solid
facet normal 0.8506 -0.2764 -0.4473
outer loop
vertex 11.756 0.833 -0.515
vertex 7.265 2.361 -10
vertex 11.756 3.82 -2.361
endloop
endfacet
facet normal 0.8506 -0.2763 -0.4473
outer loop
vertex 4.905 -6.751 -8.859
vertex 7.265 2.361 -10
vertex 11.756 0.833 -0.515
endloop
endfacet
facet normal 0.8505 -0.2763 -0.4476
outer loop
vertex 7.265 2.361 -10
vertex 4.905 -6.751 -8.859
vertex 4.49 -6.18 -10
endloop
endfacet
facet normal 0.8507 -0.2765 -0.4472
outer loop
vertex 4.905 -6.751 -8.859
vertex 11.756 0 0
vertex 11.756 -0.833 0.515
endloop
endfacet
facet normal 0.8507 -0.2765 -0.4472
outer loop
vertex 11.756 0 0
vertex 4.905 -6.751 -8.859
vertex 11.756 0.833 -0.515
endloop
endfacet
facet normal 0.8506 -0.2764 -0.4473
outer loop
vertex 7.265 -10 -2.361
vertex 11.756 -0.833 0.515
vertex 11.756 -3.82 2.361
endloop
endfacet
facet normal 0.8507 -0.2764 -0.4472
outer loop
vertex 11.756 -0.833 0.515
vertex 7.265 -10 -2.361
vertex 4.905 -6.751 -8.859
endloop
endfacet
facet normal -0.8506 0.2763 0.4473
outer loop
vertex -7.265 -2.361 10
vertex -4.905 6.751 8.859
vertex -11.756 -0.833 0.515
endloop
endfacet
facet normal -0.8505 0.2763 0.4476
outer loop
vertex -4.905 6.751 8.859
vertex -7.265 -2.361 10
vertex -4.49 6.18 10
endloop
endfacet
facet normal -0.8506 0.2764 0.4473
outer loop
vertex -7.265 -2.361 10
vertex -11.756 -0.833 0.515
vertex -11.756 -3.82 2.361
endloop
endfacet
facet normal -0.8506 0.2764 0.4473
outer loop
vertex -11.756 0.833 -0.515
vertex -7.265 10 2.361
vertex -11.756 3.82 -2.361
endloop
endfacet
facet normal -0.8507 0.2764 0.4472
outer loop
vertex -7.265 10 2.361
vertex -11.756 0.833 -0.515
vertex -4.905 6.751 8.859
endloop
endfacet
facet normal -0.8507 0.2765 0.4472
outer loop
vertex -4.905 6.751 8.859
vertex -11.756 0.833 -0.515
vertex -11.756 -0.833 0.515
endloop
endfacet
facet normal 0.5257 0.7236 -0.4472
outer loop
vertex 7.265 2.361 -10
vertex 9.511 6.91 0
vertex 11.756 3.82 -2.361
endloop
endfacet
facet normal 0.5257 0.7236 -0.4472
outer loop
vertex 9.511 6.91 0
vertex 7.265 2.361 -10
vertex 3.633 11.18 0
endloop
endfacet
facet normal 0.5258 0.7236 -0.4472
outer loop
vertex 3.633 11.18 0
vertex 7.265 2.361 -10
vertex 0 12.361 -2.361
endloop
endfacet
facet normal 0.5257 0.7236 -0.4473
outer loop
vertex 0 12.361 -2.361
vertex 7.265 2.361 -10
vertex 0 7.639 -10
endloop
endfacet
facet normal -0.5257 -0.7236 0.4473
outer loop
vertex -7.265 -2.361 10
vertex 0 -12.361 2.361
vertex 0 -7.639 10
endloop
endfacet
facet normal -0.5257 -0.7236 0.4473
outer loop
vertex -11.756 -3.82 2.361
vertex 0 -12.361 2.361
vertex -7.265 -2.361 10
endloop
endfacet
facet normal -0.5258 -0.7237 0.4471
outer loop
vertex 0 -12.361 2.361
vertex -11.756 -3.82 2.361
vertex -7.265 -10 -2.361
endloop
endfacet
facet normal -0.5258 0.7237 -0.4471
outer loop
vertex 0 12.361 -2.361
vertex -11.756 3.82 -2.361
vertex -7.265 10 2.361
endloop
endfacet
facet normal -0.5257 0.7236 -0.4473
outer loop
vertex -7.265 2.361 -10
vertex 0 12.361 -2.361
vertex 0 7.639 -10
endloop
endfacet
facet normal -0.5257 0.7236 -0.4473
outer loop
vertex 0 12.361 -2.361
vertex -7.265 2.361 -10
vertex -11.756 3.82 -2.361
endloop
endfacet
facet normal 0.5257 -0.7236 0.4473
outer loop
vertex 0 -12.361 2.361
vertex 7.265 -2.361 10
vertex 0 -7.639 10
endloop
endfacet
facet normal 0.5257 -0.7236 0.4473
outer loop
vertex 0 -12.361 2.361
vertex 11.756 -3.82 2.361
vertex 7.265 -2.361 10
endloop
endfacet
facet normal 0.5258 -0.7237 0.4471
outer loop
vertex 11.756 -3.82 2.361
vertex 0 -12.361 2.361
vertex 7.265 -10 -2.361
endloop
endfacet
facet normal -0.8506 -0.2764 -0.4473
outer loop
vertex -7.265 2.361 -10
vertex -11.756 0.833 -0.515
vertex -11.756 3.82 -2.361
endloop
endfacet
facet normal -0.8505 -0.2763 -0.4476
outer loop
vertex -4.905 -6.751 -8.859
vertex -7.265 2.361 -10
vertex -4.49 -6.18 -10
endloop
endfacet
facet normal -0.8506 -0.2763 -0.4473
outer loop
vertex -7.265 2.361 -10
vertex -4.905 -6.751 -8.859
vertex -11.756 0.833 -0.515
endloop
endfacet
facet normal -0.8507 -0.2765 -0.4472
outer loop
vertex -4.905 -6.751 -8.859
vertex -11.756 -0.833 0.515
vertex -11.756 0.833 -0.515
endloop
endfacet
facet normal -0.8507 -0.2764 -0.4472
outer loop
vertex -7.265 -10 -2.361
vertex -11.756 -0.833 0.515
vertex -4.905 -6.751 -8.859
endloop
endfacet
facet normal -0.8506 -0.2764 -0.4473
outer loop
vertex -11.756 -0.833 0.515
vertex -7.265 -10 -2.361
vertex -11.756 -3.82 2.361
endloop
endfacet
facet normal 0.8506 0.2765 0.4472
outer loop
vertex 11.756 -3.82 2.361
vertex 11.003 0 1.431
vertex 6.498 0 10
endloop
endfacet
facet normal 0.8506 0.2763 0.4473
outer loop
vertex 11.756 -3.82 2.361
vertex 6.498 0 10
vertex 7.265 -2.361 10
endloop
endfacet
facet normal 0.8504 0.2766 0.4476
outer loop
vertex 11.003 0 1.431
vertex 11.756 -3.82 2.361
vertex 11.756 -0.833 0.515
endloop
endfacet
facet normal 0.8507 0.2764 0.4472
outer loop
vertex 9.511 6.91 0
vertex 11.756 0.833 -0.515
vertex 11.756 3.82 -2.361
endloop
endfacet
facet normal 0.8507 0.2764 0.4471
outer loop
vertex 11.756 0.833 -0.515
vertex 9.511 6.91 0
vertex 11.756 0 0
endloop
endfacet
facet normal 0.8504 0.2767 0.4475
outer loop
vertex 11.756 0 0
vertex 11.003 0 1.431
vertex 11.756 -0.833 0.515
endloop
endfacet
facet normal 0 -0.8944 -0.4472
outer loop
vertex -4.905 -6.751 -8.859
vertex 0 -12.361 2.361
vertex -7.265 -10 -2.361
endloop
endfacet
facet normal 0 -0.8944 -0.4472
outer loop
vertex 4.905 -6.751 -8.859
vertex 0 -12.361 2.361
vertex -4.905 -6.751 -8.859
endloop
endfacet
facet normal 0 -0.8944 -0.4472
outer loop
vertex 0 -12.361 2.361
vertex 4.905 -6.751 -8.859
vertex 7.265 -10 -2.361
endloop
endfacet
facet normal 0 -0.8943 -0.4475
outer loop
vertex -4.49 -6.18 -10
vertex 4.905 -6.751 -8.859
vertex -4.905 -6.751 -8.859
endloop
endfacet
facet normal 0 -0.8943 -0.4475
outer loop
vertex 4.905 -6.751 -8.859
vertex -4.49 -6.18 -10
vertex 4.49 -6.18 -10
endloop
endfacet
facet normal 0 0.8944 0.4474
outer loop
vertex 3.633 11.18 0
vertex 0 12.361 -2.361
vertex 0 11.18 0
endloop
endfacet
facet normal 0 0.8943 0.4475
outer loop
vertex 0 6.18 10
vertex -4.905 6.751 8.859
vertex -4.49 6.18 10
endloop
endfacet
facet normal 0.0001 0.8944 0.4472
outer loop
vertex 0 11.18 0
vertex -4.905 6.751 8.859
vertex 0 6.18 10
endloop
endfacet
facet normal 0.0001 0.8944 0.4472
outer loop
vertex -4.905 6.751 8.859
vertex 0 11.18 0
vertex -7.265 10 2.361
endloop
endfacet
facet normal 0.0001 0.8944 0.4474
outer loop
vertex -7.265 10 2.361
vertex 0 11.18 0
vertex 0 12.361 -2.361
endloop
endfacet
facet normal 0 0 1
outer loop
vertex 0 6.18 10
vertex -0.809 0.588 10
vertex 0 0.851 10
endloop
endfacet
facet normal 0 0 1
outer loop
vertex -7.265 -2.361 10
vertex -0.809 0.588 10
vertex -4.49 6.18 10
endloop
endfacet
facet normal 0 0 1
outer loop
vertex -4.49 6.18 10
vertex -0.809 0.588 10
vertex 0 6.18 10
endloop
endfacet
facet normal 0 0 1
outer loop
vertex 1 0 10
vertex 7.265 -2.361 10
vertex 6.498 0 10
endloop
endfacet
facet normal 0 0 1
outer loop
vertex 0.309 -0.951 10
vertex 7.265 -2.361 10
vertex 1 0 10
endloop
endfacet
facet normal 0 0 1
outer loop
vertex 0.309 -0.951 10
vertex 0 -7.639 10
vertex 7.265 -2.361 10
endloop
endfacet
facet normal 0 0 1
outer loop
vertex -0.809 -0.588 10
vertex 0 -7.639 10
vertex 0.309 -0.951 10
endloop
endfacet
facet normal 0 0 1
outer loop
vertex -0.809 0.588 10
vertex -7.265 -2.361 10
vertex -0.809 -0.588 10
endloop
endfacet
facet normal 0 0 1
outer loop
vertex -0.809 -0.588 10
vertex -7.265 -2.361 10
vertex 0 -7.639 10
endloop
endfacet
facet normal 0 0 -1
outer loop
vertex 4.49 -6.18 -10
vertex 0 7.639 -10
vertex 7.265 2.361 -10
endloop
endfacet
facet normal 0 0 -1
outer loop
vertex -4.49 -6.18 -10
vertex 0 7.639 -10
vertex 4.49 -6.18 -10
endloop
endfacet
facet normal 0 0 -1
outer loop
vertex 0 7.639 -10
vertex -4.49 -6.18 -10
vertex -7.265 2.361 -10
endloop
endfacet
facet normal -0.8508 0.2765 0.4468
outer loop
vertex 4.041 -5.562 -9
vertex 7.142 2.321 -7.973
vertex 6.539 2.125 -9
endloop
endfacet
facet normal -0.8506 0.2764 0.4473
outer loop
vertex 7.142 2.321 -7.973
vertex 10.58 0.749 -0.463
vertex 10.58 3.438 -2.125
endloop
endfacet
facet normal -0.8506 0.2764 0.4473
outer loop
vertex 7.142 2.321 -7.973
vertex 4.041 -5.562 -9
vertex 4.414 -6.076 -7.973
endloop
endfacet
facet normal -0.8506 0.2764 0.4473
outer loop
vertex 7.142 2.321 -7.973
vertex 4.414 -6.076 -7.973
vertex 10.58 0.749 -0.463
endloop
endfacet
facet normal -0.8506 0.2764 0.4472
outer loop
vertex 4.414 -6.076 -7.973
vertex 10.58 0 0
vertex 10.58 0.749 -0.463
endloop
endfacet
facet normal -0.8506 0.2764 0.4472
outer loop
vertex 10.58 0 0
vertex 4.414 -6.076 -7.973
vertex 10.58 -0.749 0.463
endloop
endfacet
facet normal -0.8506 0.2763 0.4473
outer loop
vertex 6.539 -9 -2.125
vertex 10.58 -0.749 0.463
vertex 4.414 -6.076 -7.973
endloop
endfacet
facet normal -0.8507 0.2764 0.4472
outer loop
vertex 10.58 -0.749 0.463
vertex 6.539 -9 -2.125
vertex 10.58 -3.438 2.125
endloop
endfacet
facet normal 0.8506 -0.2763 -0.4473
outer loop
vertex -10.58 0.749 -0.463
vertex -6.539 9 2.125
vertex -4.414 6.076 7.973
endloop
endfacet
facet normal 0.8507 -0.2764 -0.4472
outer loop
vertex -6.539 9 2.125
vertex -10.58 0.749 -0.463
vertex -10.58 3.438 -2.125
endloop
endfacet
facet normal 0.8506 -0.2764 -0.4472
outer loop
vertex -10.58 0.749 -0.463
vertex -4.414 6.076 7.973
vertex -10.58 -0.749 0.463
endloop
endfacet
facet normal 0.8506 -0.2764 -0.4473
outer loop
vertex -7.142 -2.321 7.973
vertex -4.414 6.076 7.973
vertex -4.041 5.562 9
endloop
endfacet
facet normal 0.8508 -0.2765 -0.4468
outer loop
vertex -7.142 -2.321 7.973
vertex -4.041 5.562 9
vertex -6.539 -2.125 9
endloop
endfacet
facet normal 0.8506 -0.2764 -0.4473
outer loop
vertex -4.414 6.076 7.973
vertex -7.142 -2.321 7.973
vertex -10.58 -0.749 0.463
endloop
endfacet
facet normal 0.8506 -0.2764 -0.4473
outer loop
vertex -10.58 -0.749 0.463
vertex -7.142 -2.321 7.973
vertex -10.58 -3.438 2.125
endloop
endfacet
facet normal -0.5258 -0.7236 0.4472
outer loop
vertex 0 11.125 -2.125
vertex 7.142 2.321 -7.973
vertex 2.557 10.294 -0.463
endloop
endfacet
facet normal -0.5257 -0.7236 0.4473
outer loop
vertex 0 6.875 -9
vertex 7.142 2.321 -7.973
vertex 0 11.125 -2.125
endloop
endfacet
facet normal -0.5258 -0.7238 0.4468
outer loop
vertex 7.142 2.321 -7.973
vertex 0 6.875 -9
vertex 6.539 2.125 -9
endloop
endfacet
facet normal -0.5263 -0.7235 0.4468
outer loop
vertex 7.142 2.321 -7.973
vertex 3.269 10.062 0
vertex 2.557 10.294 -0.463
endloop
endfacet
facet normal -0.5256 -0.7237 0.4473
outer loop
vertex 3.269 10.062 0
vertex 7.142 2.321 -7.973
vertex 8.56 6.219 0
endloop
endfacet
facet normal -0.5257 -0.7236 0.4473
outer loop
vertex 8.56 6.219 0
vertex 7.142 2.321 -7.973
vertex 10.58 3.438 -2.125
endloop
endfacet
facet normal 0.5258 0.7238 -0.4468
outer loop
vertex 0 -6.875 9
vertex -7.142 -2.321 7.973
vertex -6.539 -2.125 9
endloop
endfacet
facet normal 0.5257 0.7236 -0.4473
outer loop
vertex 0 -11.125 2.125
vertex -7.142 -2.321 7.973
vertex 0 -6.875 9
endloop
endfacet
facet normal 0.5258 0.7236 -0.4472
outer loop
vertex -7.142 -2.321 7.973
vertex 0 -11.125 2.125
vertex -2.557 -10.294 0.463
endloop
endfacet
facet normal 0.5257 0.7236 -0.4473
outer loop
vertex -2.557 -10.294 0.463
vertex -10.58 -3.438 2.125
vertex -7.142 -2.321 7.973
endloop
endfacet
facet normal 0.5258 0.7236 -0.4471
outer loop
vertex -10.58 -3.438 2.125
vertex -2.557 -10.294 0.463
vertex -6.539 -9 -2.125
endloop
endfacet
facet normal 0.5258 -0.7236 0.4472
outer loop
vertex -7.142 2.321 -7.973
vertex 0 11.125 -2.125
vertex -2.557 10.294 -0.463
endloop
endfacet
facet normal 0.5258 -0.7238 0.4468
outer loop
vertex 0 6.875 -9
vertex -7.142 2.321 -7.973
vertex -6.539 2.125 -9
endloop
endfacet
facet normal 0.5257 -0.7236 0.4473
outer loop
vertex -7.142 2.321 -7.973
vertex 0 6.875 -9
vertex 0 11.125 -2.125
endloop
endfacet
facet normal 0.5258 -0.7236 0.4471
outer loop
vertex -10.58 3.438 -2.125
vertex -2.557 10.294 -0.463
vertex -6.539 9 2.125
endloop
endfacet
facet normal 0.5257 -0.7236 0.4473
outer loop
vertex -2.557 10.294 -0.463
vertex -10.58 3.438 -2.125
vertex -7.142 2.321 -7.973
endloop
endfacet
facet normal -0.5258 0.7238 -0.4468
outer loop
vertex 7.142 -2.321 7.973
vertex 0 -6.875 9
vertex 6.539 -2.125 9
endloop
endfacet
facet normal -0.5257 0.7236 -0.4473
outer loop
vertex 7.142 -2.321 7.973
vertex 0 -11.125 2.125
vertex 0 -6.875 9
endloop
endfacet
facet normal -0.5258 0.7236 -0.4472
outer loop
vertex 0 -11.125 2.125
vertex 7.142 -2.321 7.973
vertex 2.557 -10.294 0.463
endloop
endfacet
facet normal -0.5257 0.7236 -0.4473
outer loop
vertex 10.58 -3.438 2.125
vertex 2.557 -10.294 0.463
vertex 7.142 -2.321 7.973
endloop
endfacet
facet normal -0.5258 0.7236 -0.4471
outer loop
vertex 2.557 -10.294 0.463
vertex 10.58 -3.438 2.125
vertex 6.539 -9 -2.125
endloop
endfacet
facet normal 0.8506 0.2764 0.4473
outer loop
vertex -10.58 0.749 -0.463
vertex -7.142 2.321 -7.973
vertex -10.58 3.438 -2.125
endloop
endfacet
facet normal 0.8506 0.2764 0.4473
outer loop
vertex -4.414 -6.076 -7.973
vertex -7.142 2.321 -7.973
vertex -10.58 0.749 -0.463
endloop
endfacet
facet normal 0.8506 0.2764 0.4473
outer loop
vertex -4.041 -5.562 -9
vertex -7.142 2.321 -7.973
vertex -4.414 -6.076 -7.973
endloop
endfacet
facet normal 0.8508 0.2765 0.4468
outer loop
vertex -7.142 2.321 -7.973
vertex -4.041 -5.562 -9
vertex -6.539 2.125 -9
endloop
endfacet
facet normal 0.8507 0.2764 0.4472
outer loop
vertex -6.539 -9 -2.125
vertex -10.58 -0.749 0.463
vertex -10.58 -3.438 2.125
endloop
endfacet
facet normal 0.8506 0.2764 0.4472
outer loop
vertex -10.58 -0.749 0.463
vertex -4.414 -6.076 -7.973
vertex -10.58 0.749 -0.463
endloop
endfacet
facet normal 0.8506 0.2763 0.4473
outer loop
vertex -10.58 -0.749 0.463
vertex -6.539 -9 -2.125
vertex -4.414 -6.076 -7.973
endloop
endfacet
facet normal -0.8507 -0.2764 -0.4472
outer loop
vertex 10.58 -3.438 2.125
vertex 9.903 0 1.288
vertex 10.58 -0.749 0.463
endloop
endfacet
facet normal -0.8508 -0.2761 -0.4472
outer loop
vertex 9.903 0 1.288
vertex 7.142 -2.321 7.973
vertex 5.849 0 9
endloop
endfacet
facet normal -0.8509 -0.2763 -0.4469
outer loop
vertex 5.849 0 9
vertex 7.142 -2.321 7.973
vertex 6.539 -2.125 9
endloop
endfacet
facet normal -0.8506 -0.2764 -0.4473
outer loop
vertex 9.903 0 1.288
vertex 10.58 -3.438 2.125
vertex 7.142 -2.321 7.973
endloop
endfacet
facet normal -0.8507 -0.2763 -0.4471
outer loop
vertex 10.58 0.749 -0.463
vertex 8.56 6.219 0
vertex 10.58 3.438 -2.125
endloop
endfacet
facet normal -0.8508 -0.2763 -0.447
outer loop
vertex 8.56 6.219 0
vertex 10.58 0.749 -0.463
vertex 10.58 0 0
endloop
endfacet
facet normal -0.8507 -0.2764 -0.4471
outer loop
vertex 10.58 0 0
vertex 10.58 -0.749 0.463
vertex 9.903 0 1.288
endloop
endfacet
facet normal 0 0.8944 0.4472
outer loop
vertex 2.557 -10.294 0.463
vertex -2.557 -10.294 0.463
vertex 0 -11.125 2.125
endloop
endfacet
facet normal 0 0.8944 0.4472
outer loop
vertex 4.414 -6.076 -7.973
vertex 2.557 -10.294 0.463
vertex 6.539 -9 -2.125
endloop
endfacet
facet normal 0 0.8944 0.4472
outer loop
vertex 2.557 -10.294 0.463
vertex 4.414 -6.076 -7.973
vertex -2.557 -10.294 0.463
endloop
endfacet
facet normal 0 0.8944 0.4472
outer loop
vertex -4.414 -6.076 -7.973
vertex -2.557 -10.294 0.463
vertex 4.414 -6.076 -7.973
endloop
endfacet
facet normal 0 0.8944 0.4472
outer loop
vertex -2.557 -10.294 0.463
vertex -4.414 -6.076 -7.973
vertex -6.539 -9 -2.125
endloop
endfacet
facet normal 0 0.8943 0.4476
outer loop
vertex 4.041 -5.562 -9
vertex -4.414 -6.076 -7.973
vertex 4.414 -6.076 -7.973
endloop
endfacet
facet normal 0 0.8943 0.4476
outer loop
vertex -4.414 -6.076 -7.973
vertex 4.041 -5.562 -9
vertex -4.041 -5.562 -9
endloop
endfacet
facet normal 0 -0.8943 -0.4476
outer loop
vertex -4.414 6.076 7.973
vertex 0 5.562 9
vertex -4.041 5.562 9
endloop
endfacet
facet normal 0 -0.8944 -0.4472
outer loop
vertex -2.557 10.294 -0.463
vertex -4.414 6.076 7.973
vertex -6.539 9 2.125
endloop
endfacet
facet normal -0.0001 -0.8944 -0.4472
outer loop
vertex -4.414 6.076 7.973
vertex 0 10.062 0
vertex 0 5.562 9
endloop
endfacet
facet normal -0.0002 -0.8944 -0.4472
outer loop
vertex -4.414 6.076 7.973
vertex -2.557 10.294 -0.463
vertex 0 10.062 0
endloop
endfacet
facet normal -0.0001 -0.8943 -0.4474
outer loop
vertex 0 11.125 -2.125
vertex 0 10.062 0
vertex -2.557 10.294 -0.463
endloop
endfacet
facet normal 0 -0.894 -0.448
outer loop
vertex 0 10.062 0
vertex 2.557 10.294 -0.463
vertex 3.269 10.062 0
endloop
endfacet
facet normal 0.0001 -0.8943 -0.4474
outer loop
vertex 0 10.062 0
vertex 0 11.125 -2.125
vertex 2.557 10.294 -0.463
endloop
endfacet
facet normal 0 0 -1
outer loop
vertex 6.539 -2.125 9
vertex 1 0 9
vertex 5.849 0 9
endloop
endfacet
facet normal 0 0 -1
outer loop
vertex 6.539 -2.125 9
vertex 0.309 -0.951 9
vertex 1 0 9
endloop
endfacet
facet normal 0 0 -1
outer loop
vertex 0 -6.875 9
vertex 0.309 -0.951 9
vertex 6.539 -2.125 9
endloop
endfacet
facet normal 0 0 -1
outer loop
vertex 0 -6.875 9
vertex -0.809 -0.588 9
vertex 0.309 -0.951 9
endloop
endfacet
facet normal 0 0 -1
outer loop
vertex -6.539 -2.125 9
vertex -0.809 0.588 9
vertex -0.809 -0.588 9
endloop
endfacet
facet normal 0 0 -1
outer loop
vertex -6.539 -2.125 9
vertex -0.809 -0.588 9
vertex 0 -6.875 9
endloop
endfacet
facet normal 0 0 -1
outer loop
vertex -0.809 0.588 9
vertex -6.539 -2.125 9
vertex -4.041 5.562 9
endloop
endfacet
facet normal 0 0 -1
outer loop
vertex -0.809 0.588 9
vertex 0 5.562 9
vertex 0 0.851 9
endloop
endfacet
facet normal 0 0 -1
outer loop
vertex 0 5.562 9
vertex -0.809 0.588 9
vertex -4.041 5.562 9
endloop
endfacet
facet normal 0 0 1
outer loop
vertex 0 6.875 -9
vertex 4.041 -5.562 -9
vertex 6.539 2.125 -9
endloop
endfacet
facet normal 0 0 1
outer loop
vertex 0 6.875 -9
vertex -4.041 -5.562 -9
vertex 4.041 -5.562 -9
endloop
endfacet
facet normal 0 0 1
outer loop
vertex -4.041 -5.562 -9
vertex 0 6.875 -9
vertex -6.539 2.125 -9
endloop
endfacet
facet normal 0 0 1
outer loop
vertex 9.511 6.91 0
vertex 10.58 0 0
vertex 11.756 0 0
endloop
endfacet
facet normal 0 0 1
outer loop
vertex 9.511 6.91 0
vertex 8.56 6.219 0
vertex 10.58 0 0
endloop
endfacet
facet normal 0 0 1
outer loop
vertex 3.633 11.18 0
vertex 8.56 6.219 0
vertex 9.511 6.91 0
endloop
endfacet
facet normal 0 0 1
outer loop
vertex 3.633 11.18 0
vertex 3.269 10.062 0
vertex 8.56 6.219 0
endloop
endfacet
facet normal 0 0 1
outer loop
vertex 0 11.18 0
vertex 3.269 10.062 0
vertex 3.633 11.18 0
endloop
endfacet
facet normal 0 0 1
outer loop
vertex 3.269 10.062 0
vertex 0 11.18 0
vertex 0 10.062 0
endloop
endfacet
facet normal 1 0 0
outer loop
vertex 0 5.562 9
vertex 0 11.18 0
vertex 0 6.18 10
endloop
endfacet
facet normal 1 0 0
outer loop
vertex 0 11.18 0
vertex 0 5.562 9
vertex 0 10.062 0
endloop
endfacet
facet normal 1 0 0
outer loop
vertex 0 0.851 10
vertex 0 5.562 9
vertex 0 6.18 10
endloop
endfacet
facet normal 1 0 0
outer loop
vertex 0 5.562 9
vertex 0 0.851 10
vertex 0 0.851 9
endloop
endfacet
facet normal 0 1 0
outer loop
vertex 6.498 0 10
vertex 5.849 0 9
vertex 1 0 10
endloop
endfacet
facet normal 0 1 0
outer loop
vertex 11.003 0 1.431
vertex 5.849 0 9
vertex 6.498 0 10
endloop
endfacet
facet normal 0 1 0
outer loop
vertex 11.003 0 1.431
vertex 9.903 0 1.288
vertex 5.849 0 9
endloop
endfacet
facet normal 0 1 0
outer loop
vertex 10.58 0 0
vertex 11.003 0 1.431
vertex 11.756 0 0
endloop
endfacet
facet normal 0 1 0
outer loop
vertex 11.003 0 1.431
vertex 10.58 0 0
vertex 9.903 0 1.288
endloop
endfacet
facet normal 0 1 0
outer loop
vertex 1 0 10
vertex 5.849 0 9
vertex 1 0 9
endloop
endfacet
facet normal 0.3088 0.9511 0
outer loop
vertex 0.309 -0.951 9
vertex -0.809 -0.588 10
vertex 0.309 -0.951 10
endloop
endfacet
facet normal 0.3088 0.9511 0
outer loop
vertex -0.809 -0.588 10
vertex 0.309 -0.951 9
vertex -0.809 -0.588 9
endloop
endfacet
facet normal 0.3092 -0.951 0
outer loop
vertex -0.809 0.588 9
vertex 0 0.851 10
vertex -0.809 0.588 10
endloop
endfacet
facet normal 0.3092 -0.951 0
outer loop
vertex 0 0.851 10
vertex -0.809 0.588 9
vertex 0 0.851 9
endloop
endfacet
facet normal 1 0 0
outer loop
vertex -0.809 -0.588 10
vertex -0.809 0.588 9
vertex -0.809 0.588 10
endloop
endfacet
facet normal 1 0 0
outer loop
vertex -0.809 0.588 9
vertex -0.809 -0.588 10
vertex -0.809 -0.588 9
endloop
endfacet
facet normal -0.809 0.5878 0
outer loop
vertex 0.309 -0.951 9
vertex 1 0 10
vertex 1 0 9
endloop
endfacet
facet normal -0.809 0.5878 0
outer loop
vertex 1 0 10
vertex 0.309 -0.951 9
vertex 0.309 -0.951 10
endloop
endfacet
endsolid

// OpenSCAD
//saltshaker 

//modules
module box(size) {
    cube([2*size, 2*size, size], center = true); 
}

module dodecahedron(size) {
      dihedral = 116.565;
      intersection(){
            box(size);
            intersection_for(i=[1:5])  { 
                rotate([dihedral, 0, 360 / 5 * i])  box(size); 
           }
      }
}

//difference

 difference()
{
    dodecahedron(20);
    dodecahedron(18);
    cube(22);
    #cylinder(12.5);
}
